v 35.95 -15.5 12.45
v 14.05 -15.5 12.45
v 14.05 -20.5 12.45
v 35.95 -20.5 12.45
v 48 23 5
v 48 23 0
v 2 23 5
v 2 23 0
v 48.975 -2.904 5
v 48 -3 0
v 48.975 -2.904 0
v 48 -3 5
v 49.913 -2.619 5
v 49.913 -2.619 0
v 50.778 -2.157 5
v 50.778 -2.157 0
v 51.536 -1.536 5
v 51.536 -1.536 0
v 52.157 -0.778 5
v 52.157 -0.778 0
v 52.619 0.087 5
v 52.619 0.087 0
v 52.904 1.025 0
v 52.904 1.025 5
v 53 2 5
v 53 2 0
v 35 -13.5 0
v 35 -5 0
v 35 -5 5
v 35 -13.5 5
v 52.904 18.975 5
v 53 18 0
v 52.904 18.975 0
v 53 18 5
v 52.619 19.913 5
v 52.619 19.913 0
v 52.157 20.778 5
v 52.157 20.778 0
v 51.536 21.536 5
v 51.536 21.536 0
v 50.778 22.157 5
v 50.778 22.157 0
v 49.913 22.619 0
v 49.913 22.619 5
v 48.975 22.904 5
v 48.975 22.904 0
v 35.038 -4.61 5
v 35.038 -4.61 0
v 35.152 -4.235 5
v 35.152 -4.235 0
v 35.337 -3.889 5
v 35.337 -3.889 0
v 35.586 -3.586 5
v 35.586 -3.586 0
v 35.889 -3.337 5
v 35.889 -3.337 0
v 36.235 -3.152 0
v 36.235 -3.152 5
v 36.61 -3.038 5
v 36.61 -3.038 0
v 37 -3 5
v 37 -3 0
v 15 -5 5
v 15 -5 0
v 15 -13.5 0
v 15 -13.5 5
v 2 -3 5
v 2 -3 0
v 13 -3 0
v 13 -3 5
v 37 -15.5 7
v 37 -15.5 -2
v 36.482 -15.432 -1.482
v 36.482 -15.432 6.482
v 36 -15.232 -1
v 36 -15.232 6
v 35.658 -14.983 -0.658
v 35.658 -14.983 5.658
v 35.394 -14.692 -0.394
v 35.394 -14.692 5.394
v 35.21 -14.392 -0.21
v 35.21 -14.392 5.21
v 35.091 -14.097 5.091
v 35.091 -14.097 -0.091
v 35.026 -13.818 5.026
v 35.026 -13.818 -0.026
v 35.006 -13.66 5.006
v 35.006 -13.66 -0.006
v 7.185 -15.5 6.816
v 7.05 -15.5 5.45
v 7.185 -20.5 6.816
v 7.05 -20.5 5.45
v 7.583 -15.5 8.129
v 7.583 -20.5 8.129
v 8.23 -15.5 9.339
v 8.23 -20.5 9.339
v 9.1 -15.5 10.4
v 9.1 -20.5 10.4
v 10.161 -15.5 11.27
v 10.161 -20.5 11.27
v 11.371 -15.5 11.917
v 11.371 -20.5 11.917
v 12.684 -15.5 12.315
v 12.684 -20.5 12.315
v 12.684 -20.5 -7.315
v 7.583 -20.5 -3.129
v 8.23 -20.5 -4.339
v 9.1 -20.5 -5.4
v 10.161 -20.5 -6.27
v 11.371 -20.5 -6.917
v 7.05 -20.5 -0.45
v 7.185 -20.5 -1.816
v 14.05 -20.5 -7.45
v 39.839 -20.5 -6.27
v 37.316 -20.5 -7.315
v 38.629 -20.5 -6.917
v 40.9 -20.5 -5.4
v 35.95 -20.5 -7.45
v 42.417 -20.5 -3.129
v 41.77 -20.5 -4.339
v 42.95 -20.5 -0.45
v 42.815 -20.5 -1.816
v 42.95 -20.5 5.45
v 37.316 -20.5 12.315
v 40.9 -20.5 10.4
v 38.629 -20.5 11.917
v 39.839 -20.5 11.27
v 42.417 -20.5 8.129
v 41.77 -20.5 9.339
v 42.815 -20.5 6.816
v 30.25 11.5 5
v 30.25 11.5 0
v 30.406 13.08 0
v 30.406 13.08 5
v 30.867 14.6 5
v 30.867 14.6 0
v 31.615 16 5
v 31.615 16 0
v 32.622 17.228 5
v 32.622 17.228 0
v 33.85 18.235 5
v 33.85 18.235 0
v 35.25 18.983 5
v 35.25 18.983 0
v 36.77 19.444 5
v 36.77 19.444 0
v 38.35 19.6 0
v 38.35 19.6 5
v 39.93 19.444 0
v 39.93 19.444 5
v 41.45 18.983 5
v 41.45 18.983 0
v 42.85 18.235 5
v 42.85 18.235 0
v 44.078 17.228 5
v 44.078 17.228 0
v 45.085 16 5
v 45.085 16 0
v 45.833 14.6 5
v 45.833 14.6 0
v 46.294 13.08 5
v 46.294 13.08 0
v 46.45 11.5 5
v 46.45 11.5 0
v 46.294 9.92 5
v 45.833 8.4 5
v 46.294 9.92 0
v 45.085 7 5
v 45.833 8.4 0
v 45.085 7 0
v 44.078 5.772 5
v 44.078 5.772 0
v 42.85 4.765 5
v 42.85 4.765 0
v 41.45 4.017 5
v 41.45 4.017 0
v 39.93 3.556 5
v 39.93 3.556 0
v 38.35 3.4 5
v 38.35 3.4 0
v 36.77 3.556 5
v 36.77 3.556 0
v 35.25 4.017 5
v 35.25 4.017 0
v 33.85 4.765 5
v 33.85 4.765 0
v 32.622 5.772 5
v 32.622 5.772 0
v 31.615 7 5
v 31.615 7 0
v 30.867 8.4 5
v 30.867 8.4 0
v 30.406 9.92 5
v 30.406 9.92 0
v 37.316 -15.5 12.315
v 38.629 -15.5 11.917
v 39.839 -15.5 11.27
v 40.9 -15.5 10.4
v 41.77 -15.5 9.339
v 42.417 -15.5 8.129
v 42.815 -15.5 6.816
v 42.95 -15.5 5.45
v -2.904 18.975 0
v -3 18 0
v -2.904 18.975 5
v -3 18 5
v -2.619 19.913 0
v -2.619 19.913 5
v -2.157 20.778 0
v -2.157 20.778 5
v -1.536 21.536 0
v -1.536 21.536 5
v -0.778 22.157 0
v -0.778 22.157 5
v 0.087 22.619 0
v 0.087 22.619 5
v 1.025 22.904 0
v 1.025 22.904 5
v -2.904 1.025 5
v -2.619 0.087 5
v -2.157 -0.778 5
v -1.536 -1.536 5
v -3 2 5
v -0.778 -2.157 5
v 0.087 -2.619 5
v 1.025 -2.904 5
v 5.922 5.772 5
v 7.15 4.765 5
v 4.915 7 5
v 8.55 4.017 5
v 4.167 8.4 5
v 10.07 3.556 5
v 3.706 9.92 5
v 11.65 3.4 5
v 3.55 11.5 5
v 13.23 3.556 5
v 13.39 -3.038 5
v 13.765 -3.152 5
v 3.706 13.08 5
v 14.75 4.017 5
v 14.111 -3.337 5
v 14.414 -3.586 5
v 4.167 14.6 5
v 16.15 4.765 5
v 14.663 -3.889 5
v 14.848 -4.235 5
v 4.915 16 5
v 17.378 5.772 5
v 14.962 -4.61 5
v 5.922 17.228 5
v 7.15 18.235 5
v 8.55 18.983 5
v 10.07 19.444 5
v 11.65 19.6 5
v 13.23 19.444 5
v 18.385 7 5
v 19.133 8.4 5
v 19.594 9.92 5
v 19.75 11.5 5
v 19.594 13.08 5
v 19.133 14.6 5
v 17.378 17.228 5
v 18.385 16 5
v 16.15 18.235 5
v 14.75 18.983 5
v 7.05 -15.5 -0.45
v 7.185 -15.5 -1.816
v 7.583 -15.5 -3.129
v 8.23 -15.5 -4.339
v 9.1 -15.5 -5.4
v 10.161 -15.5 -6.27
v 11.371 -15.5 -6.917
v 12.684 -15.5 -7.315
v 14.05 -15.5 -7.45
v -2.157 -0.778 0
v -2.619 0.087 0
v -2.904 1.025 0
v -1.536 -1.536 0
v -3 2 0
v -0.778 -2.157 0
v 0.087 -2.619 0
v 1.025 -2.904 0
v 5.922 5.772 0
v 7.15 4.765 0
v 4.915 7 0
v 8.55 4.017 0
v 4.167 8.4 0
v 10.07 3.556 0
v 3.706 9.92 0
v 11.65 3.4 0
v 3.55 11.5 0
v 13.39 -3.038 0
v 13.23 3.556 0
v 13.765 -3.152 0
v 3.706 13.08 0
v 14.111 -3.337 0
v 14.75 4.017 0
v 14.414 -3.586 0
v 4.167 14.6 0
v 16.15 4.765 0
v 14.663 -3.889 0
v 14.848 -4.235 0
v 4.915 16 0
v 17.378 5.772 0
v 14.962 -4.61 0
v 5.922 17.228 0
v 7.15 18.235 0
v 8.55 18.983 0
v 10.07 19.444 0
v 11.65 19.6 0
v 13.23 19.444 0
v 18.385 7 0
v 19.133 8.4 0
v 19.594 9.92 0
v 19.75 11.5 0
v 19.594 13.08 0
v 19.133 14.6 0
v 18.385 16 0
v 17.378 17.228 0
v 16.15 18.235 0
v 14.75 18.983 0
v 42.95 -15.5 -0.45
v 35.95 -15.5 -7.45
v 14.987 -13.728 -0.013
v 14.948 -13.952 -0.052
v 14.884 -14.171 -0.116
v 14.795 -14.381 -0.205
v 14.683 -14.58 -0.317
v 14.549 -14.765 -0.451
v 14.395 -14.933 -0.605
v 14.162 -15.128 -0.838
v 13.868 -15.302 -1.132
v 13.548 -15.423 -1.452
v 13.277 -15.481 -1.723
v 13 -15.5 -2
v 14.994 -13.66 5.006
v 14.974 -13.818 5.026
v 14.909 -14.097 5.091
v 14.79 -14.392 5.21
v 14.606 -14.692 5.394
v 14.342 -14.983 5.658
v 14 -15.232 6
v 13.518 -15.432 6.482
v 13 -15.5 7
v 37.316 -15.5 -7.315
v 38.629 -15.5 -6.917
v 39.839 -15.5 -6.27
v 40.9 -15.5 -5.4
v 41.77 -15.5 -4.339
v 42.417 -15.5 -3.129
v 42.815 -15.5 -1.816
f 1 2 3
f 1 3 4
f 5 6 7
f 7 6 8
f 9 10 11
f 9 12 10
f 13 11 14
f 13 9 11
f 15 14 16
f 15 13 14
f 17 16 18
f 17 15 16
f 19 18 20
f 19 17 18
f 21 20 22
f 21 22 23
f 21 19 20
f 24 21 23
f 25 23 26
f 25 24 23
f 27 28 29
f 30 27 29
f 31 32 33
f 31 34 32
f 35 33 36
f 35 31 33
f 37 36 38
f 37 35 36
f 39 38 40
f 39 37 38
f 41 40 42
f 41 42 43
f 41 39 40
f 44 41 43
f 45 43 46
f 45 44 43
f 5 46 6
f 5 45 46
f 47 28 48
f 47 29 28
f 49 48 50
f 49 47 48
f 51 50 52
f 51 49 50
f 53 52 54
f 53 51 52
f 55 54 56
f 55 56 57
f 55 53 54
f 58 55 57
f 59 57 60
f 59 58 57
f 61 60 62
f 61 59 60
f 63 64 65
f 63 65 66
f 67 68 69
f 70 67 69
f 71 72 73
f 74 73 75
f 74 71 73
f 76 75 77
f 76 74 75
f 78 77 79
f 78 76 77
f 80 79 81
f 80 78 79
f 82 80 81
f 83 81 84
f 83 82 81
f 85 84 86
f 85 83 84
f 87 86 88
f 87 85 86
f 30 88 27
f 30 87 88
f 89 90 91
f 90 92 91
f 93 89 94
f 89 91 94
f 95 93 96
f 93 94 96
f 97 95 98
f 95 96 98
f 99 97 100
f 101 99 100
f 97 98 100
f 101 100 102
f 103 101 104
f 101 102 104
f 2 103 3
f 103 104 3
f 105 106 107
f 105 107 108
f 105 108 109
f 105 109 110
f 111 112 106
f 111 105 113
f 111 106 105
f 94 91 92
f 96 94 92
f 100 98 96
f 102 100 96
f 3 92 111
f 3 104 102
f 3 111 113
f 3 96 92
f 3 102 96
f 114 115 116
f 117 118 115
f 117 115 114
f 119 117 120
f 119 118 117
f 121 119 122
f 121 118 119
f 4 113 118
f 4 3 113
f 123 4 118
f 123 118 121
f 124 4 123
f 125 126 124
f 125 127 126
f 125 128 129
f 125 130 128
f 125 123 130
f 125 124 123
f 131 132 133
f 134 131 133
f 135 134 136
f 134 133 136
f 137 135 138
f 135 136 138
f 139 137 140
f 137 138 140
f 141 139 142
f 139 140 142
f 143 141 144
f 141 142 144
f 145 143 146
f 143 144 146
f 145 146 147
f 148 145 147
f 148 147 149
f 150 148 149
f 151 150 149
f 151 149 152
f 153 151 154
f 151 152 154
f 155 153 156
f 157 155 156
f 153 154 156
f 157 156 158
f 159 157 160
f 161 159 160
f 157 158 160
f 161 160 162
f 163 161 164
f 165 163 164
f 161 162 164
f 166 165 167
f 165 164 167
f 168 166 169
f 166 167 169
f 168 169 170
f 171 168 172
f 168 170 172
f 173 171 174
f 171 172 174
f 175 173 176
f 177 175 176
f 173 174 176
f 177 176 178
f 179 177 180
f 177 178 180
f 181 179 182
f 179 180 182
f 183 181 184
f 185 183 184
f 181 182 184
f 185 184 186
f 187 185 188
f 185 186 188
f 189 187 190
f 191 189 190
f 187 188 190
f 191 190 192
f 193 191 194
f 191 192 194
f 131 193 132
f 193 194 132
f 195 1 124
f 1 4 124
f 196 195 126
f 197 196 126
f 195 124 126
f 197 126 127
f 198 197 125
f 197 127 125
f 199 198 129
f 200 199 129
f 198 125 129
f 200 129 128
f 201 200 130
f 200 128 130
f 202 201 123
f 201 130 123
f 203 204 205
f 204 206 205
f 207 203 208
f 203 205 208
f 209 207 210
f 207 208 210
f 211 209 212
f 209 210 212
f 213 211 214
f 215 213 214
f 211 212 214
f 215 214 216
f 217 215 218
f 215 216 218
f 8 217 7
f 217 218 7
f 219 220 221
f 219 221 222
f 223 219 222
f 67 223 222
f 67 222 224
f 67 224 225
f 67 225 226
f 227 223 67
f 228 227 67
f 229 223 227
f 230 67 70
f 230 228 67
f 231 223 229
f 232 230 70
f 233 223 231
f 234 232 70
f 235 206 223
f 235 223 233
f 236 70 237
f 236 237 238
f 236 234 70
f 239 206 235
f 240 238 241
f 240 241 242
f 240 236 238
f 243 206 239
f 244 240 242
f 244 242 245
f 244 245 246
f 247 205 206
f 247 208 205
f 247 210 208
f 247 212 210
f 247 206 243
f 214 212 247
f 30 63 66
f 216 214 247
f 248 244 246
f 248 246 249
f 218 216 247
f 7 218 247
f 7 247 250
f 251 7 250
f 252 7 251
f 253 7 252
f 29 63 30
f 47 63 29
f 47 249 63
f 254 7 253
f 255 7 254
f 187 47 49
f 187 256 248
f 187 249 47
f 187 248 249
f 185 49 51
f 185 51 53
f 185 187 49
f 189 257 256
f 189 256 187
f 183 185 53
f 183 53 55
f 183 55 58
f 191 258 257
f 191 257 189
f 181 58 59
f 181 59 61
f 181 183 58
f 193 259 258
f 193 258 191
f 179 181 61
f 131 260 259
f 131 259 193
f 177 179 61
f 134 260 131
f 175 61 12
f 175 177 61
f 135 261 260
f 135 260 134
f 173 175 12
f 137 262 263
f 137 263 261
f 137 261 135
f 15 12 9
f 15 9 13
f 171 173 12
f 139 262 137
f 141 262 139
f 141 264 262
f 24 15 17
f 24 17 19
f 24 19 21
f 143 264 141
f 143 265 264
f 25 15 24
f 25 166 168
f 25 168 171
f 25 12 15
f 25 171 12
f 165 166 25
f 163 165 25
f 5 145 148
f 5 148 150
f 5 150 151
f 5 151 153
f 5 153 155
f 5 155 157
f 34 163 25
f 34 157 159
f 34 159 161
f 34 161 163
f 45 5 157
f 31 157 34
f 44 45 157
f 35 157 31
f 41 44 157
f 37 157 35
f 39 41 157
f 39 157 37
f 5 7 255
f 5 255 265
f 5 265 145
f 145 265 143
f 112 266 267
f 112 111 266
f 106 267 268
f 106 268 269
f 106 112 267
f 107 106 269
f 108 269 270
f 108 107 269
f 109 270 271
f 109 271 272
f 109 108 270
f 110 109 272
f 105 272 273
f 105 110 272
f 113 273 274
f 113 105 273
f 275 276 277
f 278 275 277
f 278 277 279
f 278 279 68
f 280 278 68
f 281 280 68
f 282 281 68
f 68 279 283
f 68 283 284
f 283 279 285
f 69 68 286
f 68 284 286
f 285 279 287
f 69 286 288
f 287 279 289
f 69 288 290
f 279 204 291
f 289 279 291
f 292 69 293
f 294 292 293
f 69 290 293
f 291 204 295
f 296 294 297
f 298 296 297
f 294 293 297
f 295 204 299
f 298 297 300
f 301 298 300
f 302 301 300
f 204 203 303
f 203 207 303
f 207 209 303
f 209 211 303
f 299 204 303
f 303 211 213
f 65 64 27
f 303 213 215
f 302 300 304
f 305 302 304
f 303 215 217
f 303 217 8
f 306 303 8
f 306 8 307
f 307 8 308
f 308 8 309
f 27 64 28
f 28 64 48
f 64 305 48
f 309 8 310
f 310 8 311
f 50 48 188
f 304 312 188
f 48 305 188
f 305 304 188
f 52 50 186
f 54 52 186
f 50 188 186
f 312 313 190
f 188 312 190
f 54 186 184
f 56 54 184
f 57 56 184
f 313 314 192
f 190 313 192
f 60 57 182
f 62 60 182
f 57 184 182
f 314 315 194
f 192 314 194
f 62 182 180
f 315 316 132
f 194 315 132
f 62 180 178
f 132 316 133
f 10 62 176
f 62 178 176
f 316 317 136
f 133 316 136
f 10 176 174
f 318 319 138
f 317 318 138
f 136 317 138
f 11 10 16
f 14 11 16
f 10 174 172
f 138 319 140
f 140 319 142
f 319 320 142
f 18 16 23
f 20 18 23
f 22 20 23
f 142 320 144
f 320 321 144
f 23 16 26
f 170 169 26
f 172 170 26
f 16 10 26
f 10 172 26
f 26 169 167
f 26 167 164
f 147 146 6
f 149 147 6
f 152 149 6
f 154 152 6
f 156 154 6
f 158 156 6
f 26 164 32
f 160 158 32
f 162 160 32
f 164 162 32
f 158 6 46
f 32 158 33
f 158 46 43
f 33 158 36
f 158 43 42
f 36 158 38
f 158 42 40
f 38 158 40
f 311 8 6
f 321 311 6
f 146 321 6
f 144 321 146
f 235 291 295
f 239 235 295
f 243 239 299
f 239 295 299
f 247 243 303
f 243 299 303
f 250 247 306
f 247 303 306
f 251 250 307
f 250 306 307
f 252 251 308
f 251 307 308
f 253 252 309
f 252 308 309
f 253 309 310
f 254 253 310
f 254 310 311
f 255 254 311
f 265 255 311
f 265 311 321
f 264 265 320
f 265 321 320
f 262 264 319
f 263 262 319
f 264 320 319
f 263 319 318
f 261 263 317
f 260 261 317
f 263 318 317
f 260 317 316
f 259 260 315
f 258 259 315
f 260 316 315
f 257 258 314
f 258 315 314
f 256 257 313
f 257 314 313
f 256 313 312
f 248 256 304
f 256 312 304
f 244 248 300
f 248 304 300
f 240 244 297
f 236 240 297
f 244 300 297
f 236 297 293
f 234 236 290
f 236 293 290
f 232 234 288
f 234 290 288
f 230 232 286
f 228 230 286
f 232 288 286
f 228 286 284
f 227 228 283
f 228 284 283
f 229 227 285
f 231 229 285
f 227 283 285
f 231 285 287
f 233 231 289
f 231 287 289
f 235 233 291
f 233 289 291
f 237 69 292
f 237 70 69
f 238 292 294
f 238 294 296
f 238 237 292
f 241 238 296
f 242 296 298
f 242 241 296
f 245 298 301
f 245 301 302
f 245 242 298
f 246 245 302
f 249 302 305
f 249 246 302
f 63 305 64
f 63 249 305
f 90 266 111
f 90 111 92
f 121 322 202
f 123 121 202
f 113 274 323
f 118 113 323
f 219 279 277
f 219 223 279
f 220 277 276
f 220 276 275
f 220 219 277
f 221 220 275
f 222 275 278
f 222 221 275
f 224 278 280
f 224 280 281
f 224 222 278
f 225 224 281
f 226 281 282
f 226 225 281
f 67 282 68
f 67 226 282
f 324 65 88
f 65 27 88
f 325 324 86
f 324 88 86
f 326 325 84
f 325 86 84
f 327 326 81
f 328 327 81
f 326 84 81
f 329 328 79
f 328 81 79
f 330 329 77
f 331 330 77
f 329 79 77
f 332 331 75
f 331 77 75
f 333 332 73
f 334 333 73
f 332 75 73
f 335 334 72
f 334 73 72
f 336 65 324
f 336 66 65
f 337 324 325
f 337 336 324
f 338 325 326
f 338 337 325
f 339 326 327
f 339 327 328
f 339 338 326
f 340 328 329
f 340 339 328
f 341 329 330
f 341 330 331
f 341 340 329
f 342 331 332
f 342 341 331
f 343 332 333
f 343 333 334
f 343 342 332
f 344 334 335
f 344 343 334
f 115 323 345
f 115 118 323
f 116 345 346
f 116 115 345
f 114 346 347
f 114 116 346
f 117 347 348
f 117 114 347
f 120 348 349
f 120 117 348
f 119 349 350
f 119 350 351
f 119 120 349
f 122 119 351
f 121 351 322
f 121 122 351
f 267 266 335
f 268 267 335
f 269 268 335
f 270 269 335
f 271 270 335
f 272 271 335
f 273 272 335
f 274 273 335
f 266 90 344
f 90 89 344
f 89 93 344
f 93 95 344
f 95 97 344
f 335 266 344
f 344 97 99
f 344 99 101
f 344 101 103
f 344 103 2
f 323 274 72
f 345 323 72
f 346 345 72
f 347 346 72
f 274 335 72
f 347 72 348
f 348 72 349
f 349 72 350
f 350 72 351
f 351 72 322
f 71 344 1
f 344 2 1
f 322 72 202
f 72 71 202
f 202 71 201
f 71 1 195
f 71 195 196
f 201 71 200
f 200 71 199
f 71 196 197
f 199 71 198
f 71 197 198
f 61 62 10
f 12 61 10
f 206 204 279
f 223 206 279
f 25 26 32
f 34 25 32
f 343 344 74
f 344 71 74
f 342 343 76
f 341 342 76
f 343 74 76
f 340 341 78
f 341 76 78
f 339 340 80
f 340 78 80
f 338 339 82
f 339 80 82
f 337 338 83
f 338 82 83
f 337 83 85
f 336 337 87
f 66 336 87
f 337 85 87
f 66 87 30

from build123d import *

# Parameters (mm, degrees)
SKETCH1_W           = 3
SKETCH1_H           = 23
SKETCH1_W_2         = 56
SKETCH1_H_2         = 3
BOSS_EXTRUDE1_DEPTH = 5
SKETCH7_W           = 20
SKETCH7_H           = 5
BOSS_EXTRUDE7_DEPTH = 12.5
SKETCH8_W           = 35.9
SKETCH8_H           = 19.9
BOSS_EXTRUDE8_DEPTH = 5
FILLET3_R           = 5
FILLET5_R           = 2
FILLET9_R           = 2
FILLET10_R          = 7


with BuildPart() as part:
    # Sketch1 → Boss-Extrude1 (new body)
    with BuildSketch(Plane.XY):
        with BuildLine():
            Line((50, 11.5), (46.45, 11.5))
            ThreePointArc((46.45, 11.5), (38.35, 3.4), (30.25, 11.5))
            Line((30.25, 11.5), (19.75, 11.5))
            ThreePointArc((19.75, 11.5), (11.65, 3.4), (3.55, 11.5))
            Line((3.55, 11.5), (0, 11.5))
            Line((0, 11.5), (0, 0))
            Line((0, 0), (50, 0))
            Line((50, 0), (50, 11.5))
        make_face()
        with BuildLine():
            ThreePointArc((30.25, 11.5), (38.35, 19.6), (46.45, 11.5))
            Line((46.45, 11.5), (50, 11.5))
            Line((50, 11.5), (50, 23))
            Line((50, 23), (0, 23))
            Line((0, 23), (0, 11.5))
            Line((0, 11.5), (3.55, 11.5))
            ThreePointArc((3.55, 11.5), (11.65, 19.6), (19.75, 11.5))
            Line((19.75, 11.5), (30.25, 11.5))
        make_face()
        with Locations((-1.5, 11.5)):
            Rectangle(SKETCH1_W, SKETCH1_H)
        with Locations((51.5, 11.5)):
            Rectangle(SKETCH1_W, SKETCH1_H)
        with Locations((25, -1.5)):
            Rectangle(SKETCH1_W_2, SKETCH1_H_2)
    extrude(amount=BOSS_EXTRUDE1_DEPTH)

    # Sketch7 → Boss-Extrude7 (add)
    with BuildSketch(Plane.XZ.offset(3)):
        with Locations((25, 2.5)):
            Rectangle(SKETCH7_W, SKETCH7_H)
    extrude(amount=BOSS_EXTRUDE7_DEPTH)

    # Sketch8 → Boss-Extrude8 (add)
    with BuildSketch(Plane.XZ.offset(15.5)):
        with Locations((25, 2.5)):
            Rectangle(SKETCH8_W, SKETCH8_H)
    extrude(amount=BOSS_EXTRUDE8_DEPTH)

    # Fillet3
    fillet3_edges = [part.edges().sort_by_distance(p)[0] for p in [
        (53, 23, 2.5),
        (-3, 23, 2.5),
        (53, -3, 2.5),
        (-3, -3, 2.5),
    ]]
    fillet(fillet3_edges, radius=FILLET3_R)

    # Fillet5
    fillet5_edges = [part.edges().sort_by_distance(p)[0] for p in [
        (35, -3, 2.5),
        (15, -3, 2.5),
    ]]
    fillet(fillet5_edges, radius=FILLET5_R)

    # Fillet9
    fillet9_edges = [part.edges().sort_by_distance(p)[0] for p in [
        (35, -15.5, 2.5),
        (25, -15.5, 5),
        (15, -15.5, 2.5),
        (25, -15.5, 0),
    ]]
    fillet(fillet9_edges, radius=FILLET9_R)

    # Fillet10
    fillet10_edges = [part.edges().sort_by_distance(p)[0] for p in [
        (42.95, -18, -7.45),
        (42.95, -18, 12.45),
        (7.05, -18, 12.45),
        (7.05, -18, -7.45),
    ]]
    fillet(fillet10_edges, radius=FILLET10_R)


solid = part.part
